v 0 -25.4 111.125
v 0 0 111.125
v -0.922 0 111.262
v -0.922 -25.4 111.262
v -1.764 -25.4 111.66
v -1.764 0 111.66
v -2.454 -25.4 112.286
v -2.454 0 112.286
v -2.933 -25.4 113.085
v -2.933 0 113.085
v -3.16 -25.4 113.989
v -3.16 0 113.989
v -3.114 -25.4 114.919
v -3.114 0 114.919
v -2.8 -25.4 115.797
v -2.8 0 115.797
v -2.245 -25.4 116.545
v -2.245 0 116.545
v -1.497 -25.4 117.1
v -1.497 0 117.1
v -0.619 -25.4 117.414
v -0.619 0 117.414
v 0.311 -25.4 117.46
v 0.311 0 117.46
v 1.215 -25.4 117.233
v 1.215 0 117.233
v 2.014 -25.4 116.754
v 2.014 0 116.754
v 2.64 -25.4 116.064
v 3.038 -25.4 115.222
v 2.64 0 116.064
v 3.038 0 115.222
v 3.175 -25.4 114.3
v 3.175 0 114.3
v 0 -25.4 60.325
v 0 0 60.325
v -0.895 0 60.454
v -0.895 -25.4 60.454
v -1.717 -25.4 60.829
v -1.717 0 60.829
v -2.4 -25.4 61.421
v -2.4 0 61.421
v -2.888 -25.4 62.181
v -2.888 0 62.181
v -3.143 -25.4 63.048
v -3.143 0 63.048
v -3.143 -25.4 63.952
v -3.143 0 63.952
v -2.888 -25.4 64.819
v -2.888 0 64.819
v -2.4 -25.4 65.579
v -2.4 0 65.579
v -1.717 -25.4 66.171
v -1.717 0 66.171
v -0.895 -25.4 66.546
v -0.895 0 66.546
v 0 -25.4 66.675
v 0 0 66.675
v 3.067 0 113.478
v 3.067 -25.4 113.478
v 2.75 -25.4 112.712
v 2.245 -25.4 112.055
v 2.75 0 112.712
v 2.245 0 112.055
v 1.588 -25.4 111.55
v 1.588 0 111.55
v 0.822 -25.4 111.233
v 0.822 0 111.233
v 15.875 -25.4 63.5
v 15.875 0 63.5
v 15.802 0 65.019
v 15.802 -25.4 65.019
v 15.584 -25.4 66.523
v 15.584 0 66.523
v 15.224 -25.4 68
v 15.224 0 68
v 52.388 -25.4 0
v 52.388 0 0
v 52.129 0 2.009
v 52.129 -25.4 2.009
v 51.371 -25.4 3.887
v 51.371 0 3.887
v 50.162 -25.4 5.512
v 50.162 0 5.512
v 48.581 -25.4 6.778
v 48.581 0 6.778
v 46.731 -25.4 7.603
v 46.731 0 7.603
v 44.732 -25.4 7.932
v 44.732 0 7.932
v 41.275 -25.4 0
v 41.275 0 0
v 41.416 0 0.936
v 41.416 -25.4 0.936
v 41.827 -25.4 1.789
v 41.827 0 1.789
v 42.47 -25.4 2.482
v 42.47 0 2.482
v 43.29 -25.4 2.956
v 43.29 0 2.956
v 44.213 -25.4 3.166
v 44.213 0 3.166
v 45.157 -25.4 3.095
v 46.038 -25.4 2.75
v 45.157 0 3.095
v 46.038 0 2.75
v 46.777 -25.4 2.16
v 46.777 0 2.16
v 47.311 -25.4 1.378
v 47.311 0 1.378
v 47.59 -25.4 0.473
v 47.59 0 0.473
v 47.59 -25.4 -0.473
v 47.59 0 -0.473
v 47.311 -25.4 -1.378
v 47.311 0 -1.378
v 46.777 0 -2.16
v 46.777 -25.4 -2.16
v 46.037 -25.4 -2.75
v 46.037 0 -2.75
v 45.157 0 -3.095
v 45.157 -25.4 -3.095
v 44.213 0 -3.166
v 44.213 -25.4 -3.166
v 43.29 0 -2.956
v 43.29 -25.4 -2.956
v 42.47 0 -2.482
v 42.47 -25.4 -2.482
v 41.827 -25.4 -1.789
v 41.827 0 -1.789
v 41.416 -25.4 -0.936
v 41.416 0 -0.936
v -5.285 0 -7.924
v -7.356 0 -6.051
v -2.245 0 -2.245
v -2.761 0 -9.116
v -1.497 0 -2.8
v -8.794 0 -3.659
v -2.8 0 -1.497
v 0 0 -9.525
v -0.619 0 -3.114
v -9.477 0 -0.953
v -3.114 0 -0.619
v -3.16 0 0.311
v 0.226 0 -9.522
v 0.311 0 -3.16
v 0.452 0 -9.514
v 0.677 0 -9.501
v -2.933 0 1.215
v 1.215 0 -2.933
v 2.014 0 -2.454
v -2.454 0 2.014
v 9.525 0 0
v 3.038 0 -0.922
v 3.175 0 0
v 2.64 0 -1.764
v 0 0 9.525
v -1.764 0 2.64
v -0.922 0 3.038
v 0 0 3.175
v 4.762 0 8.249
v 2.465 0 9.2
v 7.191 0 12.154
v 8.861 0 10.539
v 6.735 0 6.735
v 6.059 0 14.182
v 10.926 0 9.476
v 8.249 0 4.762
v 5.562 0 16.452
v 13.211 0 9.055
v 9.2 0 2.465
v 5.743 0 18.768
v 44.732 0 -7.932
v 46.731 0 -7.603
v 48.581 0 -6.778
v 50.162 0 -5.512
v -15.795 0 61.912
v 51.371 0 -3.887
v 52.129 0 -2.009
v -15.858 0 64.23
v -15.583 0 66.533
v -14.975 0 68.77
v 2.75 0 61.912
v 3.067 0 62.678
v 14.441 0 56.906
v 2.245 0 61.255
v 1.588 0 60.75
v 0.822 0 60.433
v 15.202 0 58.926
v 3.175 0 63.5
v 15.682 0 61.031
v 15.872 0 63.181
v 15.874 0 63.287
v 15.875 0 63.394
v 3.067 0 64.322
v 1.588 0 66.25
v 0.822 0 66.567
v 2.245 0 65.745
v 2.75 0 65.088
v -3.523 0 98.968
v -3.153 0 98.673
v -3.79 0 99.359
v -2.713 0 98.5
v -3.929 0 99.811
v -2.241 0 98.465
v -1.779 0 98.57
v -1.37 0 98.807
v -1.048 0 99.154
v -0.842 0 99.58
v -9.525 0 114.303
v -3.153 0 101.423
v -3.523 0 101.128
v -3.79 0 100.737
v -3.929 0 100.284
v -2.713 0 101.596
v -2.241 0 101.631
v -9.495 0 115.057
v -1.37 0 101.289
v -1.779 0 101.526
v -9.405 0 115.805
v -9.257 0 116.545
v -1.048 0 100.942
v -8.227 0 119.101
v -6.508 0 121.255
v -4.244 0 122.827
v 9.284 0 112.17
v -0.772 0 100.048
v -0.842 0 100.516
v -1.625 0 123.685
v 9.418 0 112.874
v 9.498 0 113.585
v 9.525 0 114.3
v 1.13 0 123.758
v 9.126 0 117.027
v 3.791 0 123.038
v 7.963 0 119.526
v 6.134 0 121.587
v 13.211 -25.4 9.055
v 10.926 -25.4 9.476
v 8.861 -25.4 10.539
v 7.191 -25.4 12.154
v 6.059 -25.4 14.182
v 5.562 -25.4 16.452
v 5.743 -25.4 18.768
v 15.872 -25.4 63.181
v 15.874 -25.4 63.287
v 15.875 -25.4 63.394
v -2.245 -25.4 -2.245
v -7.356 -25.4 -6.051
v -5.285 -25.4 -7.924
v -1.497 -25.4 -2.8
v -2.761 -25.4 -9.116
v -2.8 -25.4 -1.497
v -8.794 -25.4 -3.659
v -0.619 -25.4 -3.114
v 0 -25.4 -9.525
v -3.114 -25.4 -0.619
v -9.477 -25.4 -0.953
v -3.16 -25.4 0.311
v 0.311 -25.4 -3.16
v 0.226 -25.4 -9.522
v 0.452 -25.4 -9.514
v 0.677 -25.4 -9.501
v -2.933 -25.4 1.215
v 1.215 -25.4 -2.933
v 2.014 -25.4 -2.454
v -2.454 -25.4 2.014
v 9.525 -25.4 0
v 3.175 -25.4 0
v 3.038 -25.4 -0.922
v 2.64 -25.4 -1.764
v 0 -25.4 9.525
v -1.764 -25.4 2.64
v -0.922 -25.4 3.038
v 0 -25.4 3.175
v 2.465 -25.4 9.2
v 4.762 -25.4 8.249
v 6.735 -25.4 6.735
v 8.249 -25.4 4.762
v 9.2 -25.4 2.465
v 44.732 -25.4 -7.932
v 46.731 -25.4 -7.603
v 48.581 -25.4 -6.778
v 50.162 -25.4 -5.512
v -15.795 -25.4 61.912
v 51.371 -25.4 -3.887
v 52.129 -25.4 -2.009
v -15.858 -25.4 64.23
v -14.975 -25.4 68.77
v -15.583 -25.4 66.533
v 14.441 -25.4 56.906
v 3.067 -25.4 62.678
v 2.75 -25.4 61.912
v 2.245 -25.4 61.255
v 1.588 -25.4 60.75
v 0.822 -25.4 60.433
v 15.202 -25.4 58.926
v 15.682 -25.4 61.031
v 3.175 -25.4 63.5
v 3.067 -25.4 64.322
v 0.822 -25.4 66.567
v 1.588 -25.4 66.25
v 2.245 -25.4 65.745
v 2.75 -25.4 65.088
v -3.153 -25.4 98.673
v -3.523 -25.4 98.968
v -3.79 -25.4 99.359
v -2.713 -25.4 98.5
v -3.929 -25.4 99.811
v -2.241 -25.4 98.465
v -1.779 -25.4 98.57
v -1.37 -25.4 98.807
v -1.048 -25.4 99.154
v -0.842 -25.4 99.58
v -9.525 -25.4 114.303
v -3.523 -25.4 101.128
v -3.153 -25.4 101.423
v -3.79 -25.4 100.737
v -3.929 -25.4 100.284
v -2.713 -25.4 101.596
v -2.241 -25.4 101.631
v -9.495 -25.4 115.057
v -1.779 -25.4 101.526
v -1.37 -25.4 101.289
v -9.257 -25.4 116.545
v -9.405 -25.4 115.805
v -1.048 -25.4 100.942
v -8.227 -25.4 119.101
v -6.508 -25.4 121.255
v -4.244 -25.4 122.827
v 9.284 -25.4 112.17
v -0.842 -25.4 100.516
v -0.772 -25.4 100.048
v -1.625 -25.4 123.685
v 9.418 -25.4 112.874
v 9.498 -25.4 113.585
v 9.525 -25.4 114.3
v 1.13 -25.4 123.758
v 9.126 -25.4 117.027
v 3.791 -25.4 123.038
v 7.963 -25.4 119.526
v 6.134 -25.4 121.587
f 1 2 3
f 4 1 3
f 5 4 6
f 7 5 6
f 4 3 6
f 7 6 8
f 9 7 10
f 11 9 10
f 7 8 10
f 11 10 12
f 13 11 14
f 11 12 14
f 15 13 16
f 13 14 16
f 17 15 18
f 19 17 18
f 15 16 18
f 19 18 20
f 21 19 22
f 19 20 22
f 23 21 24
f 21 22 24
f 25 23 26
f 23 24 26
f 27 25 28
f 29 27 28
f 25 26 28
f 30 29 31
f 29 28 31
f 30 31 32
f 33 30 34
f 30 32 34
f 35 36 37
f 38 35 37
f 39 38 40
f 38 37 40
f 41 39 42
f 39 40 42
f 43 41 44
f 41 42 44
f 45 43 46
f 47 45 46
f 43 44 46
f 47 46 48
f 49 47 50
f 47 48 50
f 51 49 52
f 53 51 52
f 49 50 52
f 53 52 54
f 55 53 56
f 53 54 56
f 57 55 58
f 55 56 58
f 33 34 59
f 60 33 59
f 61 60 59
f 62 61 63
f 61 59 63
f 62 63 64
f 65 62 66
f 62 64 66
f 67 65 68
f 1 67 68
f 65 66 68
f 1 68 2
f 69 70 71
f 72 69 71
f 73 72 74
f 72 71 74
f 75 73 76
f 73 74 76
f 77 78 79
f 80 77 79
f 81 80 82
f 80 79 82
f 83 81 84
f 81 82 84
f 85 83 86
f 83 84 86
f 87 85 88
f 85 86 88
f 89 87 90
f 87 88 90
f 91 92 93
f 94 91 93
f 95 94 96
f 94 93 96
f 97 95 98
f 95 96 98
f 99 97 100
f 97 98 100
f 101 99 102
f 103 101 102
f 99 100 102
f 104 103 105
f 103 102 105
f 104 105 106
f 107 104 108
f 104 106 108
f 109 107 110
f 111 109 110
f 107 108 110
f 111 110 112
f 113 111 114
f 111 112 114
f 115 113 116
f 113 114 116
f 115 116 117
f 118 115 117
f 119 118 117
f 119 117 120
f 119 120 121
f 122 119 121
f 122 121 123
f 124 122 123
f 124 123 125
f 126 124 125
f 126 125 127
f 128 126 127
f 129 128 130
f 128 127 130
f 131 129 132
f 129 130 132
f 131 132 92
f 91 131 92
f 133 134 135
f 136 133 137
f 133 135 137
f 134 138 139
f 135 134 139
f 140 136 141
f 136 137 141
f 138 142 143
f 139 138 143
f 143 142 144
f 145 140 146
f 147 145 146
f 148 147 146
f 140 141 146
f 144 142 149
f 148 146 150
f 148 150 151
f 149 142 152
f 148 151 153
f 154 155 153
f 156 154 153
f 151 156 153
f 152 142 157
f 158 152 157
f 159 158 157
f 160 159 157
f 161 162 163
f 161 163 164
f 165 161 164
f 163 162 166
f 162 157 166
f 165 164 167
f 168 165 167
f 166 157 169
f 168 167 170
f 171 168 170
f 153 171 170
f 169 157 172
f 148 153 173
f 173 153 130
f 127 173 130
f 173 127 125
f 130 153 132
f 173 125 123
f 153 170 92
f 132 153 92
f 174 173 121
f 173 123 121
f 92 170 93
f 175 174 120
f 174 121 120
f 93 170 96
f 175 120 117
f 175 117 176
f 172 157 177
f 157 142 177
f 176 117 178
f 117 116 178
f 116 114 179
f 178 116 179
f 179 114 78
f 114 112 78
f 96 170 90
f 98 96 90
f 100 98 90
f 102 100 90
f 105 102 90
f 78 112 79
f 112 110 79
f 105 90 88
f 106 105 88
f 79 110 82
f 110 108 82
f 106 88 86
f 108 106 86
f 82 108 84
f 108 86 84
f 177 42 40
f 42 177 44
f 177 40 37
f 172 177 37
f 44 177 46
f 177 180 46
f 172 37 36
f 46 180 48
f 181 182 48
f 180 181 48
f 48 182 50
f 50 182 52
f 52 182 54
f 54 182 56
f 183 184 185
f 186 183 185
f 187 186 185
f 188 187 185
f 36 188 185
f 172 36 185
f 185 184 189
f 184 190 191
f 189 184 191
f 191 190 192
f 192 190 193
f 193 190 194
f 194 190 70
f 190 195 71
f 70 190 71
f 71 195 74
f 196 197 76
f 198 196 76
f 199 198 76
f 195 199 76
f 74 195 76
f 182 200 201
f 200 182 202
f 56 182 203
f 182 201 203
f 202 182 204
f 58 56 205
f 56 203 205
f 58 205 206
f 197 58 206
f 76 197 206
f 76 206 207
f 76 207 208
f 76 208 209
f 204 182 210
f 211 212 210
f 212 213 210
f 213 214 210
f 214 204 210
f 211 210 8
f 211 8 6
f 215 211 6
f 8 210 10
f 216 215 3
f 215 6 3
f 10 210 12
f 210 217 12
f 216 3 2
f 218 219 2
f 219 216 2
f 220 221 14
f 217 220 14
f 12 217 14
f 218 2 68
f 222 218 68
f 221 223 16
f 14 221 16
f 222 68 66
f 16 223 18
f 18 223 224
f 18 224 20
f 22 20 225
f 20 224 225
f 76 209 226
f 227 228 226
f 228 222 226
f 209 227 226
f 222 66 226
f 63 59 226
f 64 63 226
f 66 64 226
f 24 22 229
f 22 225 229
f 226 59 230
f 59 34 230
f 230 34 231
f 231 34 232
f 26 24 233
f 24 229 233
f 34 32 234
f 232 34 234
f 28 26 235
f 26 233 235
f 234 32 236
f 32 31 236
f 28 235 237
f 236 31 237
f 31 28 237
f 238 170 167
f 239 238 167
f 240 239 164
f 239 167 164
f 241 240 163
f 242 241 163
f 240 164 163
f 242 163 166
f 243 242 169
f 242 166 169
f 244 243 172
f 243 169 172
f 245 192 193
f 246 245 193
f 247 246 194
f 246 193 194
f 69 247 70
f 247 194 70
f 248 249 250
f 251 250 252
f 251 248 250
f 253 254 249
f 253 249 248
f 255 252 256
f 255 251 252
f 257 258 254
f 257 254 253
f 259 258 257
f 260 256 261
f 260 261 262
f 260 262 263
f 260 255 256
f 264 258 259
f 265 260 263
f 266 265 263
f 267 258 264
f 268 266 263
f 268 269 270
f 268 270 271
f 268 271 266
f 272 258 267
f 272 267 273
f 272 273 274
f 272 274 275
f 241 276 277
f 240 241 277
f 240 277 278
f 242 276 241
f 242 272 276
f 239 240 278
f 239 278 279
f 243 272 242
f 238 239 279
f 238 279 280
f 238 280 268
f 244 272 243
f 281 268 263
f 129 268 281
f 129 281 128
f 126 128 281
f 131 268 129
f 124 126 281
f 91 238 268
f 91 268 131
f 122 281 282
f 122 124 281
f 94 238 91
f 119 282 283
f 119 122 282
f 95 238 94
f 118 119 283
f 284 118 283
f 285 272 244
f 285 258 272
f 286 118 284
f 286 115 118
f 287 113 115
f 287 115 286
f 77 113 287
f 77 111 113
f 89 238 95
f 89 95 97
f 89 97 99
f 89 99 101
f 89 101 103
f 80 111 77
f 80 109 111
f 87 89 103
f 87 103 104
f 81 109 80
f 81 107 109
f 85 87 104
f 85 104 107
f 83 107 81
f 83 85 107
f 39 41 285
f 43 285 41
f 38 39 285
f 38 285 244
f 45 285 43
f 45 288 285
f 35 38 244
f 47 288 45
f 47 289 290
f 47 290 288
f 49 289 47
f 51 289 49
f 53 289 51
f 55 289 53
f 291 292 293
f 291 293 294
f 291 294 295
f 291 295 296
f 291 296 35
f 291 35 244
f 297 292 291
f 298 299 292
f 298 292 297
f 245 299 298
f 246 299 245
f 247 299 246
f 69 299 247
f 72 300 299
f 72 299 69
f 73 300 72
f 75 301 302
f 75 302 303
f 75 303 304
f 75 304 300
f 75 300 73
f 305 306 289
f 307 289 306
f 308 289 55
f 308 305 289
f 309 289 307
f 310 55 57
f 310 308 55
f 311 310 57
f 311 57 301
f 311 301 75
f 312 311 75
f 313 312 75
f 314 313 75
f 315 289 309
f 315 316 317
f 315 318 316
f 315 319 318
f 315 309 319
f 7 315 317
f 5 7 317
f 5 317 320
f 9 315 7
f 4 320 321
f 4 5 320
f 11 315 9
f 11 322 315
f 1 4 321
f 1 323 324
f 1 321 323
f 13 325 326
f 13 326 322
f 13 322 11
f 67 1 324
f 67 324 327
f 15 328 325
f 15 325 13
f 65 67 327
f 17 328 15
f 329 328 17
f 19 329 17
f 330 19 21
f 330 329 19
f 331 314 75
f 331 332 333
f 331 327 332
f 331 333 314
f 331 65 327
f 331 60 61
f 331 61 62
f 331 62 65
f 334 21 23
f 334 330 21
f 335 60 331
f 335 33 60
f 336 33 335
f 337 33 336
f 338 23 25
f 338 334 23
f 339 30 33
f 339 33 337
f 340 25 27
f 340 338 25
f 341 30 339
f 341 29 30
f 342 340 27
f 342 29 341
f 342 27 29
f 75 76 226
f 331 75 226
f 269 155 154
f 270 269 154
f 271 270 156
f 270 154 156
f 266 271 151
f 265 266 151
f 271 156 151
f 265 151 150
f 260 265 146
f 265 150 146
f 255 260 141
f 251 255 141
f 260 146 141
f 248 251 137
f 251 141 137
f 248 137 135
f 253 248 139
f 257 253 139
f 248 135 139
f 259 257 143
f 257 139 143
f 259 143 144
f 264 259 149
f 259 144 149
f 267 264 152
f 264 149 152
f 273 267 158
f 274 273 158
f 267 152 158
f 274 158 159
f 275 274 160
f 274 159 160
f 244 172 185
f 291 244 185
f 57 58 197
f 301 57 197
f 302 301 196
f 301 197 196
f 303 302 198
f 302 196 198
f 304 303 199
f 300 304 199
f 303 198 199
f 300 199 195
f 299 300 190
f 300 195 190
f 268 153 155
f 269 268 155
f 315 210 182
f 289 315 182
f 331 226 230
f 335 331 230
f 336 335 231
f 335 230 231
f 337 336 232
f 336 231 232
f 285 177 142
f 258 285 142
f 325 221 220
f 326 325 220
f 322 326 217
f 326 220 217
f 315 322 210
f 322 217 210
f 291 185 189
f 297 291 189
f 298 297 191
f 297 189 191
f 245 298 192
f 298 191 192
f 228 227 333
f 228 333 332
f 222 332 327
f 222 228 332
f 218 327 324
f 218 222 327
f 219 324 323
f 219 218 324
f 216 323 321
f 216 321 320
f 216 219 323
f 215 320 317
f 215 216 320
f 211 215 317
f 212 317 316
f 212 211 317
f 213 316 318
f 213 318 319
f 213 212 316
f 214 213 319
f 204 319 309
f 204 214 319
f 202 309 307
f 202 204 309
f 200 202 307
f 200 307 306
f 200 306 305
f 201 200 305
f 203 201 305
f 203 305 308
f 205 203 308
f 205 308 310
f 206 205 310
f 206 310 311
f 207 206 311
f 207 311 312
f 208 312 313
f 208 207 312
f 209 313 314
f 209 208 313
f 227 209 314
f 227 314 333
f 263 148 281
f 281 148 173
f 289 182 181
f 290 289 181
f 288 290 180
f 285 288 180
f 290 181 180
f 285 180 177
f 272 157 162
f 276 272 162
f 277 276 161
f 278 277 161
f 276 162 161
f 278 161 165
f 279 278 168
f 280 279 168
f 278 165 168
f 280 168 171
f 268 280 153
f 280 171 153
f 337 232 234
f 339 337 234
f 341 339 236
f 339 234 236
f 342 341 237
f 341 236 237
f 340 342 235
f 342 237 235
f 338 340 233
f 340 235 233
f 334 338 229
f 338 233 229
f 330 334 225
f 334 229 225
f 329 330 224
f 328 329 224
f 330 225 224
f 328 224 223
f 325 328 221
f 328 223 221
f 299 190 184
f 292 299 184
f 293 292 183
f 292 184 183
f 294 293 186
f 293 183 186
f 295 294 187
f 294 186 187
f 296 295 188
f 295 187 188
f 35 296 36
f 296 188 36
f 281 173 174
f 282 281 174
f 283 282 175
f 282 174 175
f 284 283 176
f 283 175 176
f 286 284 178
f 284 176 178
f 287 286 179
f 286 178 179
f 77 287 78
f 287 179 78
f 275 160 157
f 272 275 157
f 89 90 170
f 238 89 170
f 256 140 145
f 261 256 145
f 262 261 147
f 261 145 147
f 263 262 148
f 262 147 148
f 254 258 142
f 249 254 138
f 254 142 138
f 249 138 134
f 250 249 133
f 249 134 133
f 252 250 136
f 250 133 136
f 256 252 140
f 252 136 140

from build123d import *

# Parameters (mm, degrees)
F0_R     = 1.5875
F1_DEPTH = 25.4


with BuildPart() as f1:
    # F0 (on Front) → F1 (new body)
    with BuildSketch(Plane.XZ):
        with BuildLine():
            ThreePointArc((0, 9.525), (-7.063929059, 6.3895642457), (-9.4772553384, -0.9525))
            ThreePointArc((-9.4772553384, -0.9525), (-6.3895642457, -7.063929059), (0, -9.525))
            Line((0, -9.525), (0.6773435479, -9.500885786))
            ThreePointArc((0.6773435479, -9.500885786), (6.9705567315, -6.4912990883), (9.525, 0))
            Line((9.525, 0), (3.175, 0))
            ThreePointArc((3.175, 0), (-2.2450640303, -2.2450640303), (0, 3.175))
            Line((0, 3.175), (0, 9.525))
        make_face()
        with BuildLine():
            Line((-15.7954255641, 61.9125), (-9.4772553384, -0.9525))
            ThreePointArc((-9.4772553384, -0.9525), (-7.063929059, 6.3895642457), (0, 9.525))
            Line((0, 9.525), (0, 47.625))
            ThreePointArc((0, 47.625), (-10.6492737428, 51.7267849017), (-15.7954255641, 61.9125))
        make_face()
        with BuildLine():
            Line((0.6773435479, -9.500885786), (0, -9.525))
            ThreePointArc((0, -9.525), (0.3388863295, -9.5189695375), (0.6773435479, -9.500885786))
        make_face()
        with BuildLine():
            Line((0, 47.625), (0, 9.525))
            ThreePointArc((0, 9.525), (6.7351920908, 6.7351920908), (9.525, 0))
            Line((9.525, 0), (36.5125, 0))
            ThreePointArc((36.5125, 0), (38.9380895153, 5.7116327839), (44.7324052746, 7.9324746146))
            Line((44.7324052746, 7.9324746146), (13.2108551379, 9.0546782715))
            ThreePointArc((13.2108551379, 9.0546782715), (7.1911937291, 12.1538217133), (5.742542983, 18.767627317))
            Line((5.742542983, 18.767627317), (14.4405270392, 56.9055474959))
            ThreePointArc((14.4405270392, 56.9055474959), (8.5827935865, 50.145177678), (0, 47.625))
        make_face()
        with BuildLine():
            Line((-14.9746534016, 68.7702353365), (-15.7954255641, 61.9125))
            ThreePointArc((-15.7954255641, 61.9125), (-10.6492737428, 51.7267849017), (0, 47.625))
            Line((0, 47.625), (0, 60.325))
            ThreePointArc((0, 60.325), (-3.175, 63.5), (0, 66.675))
            Line((0, 66.675), (0, 79.375))
            ThreePointArc((0, 79.375), (-9.1747108683, 76.4553195825), (-14.9746534016, 68.7702353365))
        make_face()
        with BuildLine():
            ThreePointArc((-14.9746534016, 68.7702353365), (-15.7625053013, 65.3865448909), (-15.7954255641, 61.9125))
            Line((-15.7954255641, 61.9125), (-14.9746534016, 68.7702353365))
        make_face()
        with BuildLine():
            ThreePointArc((9.525, 0), (6.9705567315, -6.4912990883), (0.6773435479, -9.500885786))
            Line((0.6773435479, -9.500885786), (44.7324052746, -7.9324746146))
            ThreePointArc((44.7324052746, -7.9324746146), (38.9380895153, -5.7116327839), (36.5125, 0))
            Line((36.5125, 0), (9.525, 0))
        make_face()
        with BuildLine():
            Line((0, 60.325), (0, 47.625))
            ThreePointArc((0, 47.625), (8.5827935865, 50.145177678), (14.4405270392, 56.9055474959))
            Line((14.4405270392, 56.9055474959), (15.8717991204, 63.1812247139))
            Line((15.8717991204, 63.1812247139), (15.2237290867, 68.0004108363))
            ThreePointArc((15.2237290867, 68.0004108363), (9.5018841019, 76.2173040977), (0, 79.375))
            Line((0, 79.375), (0, 66.675))
            ThreePointArc((0, 66.675), (2.2450640303, 65.7450640303), (3.175, 63.5))
            ThreePointArc((3.175, 63.5), (2.2450640303, 61.2549359697), (0, 60.325))
        make_face()
        with BuildLine():
            Line((-9.524999423, 114.3033154892), (-14.9746534016, 68.7702353365))
            ThreePointArc((-14.9746534016, 68.7702353365), (-9.1747108683, 76.4553195825), (0, 79.375))
            Line((0, 79.375), (0, 100.0252))
            Line((0, 100.0252), (0, 104.775))
            ThreePointArc((0, 104.775), (-6.7363641912, 107.5659802137), (-9.524999423, 114.3033154892))
        make_face()
        with Locations((-2.3593854516, 100.0478582527)):
            Circle(F0_R, mode=Mode.SUBTRACT)
        with BuildLine():
            ThreePointArc((36.5125, 0), (38.9380895153, -5.7116327839), (44.7324052746, -7.9324746146))
            ThreePointArc((44.7324052746, -7.9324746146), (50.1616327839, -5.5119104847), (52.3875, 0))
            ThreePointArc((52.3875, 0), (50.1616327839, 5.5119104847), (44.7324052746, 7.9324746146))
            ThreePointArc((44.7324052746, 7.9324746146), (38.9380895153, 5.7116327839), (36.5125, 0))
        make_face()
        with BuildLine():
            ThreePointArc((47.625, 0), (44.45, -3.175), (41.275, 0))
            ThreePointArc((41.275, 0), (44.45, 3.175), (47.625, 0))
        make_face(mode=Mode.SUBTRACT)
        with BuildLine():
            Line((15.8717991204, 63.1812247139), (14.4405270392, 56.9055474959))
            ThreePointArc((14.4405270392, 56.9055474959), (15.4775744365, 59.9700829241), (15.8717991204, 63.1812247139))
        make_face()
        with BuildLine():
            Line((0, 100.0252), (0, 79.375))
            ThreePointArc((0, 79.375), (9.5018841019, 76.2173040977), (15.2237290867, 68.0004108363))
            Line((15.2237290867, 68.0004108363), (9.283878963, 112.1703952479))
            ThreePointArc((9.283878963, 112.1703952479), (5.9346920618, 106.8498285166), (0, 104.775))
            Line((0, 104.775), (0, 100.0252))
        make_face()
        with BuildLine():
            Line((-9.2567511899, 116.5445895858), (-9.524999423, 114.3033154892))
            ThreePointArc((-9.524999423, 114.3033154892), (-6.7363641912, 107.5659802137), (0, 104.775))
            ThreePointArc((0, 104.775), (5.9346920618, 106.8498285166), (9.283878963, 112.1703952479))
            ThreePointArc((9.283878963, 112.1703952479), (9.464527778, 113.2283942242), (9.525, 114.3))
            ThreePointArc((9.525, 114.3), (1.13028092, 123.7577000397), (-9.2567511899, 116.5445895858))
        make_face()
        with BuildLine():
            ThreePointArc((3.175, 114.3), (2.2450640303, 112.0549359697), (0, 111.125))
            ThreePointArc((0, 111.125), (-2.2450640303, 116.5450640303), (3.175, 114.3))
        make_face(mode=Mode.SUBTRACT)
        with BuildLine():
            ThreePointArc((-9.2567511899, 116.5445895858), (-9.4575031808, 115.4319269345), (-9.524999423, 114.3033154892))
            Line((-9.524999423, 114.3033154892), (-9.2567511899, 116.5445895858))
        make_face()
        with BuildLine():
            Line((15.2237290867, 68.0004108363), (15.8717991204, 63.1812247139))
            ThreePointArc((15.8717991204, 63.1812247139), (15.8741997599, 63.340604322), (15.875, 63.5))
            ThreePointArc((15.875, 63.5), (15.7113386484, 65.7736452834), (15.2237290867, 68.0004108363))
        make_face()
    extrude(amount=F1_DEPTH)


solid = f1.part
